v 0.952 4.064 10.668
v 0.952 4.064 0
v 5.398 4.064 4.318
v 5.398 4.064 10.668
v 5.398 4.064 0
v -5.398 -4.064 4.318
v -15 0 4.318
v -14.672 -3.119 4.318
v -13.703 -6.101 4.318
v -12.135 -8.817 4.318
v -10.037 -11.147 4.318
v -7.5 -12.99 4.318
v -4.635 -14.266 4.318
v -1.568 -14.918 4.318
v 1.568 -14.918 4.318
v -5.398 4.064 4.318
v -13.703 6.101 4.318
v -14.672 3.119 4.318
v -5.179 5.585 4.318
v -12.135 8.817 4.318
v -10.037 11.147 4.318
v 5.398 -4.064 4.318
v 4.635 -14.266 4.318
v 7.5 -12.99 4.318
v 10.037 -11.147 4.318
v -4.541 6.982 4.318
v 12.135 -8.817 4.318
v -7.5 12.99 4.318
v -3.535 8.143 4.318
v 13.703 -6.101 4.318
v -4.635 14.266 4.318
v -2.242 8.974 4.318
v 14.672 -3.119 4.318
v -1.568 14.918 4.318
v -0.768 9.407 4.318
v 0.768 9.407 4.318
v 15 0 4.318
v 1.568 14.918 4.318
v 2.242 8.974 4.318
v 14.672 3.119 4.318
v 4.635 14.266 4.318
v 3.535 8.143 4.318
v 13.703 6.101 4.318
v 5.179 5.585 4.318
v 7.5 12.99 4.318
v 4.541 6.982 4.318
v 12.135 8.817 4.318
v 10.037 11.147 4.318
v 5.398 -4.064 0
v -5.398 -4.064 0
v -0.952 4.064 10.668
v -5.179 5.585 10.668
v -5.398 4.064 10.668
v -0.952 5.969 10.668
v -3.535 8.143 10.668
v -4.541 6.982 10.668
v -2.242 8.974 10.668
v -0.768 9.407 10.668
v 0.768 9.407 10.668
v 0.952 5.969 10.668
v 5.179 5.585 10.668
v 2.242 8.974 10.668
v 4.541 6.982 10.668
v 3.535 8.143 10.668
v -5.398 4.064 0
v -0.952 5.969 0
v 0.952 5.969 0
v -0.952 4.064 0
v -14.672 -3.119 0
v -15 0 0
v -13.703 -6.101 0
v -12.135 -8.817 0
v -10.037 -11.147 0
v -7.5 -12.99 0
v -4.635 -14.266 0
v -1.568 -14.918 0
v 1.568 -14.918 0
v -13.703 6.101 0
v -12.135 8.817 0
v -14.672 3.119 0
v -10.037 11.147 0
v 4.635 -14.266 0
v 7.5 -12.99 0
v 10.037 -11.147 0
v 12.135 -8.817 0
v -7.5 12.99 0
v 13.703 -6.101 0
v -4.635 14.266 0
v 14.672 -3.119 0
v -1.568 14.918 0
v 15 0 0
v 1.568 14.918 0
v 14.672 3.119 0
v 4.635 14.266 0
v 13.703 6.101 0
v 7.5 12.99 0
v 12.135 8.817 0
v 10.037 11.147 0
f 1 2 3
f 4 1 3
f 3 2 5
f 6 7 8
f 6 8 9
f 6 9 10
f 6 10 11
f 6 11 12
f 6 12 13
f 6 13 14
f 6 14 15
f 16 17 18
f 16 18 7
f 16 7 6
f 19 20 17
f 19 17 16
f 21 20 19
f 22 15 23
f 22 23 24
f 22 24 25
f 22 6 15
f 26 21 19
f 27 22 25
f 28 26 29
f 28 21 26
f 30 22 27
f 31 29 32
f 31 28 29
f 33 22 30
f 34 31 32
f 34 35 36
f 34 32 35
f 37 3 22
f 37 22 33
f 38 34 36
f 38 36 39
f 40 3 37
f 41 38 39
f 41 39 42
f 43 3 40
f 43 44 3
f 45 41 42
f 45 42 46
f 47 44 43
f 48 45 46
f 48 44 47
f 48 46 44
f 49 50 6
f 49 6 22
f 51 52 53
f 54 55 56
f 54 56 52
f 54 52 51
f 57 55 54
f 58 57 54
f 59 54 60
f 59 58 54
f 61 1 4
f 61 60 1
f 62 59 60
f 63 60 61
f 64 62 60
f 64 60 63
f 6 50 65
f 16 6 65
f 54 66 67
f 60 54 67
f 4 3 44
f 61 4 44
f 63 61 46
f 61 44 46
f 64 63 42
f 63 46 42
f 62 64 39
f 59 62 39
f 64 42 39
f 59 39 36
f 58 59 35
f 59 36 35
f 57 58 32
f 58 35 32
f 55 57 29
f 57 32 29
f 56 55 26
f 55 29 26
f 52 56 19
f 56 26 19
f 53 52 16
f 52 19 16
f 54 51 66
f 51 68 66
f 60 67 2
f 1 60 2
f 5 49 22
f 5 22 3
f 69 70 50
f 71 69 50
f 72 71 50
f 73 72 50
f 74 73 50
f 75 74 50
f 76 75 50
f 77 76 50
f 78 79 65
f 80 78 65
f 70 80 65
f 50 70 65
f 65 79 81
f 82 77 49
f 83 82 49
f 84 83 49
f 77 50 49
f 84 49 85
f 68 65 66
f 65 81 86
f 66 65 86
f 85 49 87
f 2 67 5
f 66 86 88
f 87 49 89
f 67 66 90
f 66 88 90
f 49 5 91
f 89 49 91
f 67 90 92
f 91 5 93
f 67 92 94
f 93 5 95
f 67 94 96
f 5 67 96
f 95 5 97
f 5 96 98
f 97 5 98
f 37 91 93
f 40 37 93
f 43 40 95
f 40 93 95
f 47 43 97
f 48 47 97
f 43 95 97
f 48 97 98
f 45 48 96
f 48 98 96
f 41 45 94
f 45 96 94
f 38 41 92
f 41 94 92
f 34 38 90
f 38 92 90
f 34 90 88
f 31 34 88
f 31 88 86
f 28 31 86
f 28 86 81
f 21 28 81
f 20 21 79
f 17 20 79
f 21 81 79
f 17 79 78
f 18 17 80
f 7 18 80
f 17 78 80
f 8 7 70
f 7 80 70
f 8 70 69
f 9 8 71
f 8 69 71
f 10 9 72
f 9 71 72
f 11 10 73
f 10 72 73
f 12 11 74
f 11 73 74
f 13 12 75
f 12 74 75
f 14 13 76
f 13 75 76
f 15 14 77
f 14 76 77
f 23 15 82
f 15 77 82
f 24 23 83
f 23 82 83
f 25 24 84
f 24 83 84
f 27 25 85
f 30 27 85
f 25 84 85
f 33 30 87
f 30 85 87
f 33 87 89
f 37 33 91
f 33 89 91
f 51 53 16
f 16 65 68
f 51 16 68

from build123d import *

# Parameters (mm, degrees)
F0_R     = 15
F0_W     = 10.795
F0_H     = 8.128
F1_DEPTH = 4.318
F2_W     = 1.905
F2_H     = 1.905
F3_DEPTH = 25.4
F5_DEPTH = 6.35


with BuildPart() as f1:
    # F0 (on Top) → F1 (new body)
    with BuildSketch(Plane.XY):
        Circle(F0_R)
        Rectangle(F0_W, F0_H, mode=Mode.SUBTRACT)
    extrude(amount=F1_DEPTH)

    # F2 (on face) → F3 (cut)
    with BuildSketch(Plane.XY.offset(4.318)):
        with Locations((0, 5.0165)):
            Rectangle(F2_W, F2_H)
    extrude(amount=-F3_DEPTH, mode=Mode.SUBTRACT)

    # F4 (on face) → F5 (join)
    with BuildSketch(Plane.XY.offset(4.318)):
        with BuildLine():
            Line((0.9525, 4.064), (5.3975, 4.064))
            ThreePointArc((5.3975, 4.064), (0, 9.4615), (-5.3975, 4.064))
            Line((-5.3975, 4.064), (-0.9525, 4.064))
            Line((-0.9525, 4.064), (-0.9525, 5.969))
            Line((-0.9525, 5.969), (0.9525, 5.969))
            Line((0.9525, 5.969), (0.9525, 4.064))
        make_face()
    extrude(amount=F5_DEPTH)


solid = f1.part
